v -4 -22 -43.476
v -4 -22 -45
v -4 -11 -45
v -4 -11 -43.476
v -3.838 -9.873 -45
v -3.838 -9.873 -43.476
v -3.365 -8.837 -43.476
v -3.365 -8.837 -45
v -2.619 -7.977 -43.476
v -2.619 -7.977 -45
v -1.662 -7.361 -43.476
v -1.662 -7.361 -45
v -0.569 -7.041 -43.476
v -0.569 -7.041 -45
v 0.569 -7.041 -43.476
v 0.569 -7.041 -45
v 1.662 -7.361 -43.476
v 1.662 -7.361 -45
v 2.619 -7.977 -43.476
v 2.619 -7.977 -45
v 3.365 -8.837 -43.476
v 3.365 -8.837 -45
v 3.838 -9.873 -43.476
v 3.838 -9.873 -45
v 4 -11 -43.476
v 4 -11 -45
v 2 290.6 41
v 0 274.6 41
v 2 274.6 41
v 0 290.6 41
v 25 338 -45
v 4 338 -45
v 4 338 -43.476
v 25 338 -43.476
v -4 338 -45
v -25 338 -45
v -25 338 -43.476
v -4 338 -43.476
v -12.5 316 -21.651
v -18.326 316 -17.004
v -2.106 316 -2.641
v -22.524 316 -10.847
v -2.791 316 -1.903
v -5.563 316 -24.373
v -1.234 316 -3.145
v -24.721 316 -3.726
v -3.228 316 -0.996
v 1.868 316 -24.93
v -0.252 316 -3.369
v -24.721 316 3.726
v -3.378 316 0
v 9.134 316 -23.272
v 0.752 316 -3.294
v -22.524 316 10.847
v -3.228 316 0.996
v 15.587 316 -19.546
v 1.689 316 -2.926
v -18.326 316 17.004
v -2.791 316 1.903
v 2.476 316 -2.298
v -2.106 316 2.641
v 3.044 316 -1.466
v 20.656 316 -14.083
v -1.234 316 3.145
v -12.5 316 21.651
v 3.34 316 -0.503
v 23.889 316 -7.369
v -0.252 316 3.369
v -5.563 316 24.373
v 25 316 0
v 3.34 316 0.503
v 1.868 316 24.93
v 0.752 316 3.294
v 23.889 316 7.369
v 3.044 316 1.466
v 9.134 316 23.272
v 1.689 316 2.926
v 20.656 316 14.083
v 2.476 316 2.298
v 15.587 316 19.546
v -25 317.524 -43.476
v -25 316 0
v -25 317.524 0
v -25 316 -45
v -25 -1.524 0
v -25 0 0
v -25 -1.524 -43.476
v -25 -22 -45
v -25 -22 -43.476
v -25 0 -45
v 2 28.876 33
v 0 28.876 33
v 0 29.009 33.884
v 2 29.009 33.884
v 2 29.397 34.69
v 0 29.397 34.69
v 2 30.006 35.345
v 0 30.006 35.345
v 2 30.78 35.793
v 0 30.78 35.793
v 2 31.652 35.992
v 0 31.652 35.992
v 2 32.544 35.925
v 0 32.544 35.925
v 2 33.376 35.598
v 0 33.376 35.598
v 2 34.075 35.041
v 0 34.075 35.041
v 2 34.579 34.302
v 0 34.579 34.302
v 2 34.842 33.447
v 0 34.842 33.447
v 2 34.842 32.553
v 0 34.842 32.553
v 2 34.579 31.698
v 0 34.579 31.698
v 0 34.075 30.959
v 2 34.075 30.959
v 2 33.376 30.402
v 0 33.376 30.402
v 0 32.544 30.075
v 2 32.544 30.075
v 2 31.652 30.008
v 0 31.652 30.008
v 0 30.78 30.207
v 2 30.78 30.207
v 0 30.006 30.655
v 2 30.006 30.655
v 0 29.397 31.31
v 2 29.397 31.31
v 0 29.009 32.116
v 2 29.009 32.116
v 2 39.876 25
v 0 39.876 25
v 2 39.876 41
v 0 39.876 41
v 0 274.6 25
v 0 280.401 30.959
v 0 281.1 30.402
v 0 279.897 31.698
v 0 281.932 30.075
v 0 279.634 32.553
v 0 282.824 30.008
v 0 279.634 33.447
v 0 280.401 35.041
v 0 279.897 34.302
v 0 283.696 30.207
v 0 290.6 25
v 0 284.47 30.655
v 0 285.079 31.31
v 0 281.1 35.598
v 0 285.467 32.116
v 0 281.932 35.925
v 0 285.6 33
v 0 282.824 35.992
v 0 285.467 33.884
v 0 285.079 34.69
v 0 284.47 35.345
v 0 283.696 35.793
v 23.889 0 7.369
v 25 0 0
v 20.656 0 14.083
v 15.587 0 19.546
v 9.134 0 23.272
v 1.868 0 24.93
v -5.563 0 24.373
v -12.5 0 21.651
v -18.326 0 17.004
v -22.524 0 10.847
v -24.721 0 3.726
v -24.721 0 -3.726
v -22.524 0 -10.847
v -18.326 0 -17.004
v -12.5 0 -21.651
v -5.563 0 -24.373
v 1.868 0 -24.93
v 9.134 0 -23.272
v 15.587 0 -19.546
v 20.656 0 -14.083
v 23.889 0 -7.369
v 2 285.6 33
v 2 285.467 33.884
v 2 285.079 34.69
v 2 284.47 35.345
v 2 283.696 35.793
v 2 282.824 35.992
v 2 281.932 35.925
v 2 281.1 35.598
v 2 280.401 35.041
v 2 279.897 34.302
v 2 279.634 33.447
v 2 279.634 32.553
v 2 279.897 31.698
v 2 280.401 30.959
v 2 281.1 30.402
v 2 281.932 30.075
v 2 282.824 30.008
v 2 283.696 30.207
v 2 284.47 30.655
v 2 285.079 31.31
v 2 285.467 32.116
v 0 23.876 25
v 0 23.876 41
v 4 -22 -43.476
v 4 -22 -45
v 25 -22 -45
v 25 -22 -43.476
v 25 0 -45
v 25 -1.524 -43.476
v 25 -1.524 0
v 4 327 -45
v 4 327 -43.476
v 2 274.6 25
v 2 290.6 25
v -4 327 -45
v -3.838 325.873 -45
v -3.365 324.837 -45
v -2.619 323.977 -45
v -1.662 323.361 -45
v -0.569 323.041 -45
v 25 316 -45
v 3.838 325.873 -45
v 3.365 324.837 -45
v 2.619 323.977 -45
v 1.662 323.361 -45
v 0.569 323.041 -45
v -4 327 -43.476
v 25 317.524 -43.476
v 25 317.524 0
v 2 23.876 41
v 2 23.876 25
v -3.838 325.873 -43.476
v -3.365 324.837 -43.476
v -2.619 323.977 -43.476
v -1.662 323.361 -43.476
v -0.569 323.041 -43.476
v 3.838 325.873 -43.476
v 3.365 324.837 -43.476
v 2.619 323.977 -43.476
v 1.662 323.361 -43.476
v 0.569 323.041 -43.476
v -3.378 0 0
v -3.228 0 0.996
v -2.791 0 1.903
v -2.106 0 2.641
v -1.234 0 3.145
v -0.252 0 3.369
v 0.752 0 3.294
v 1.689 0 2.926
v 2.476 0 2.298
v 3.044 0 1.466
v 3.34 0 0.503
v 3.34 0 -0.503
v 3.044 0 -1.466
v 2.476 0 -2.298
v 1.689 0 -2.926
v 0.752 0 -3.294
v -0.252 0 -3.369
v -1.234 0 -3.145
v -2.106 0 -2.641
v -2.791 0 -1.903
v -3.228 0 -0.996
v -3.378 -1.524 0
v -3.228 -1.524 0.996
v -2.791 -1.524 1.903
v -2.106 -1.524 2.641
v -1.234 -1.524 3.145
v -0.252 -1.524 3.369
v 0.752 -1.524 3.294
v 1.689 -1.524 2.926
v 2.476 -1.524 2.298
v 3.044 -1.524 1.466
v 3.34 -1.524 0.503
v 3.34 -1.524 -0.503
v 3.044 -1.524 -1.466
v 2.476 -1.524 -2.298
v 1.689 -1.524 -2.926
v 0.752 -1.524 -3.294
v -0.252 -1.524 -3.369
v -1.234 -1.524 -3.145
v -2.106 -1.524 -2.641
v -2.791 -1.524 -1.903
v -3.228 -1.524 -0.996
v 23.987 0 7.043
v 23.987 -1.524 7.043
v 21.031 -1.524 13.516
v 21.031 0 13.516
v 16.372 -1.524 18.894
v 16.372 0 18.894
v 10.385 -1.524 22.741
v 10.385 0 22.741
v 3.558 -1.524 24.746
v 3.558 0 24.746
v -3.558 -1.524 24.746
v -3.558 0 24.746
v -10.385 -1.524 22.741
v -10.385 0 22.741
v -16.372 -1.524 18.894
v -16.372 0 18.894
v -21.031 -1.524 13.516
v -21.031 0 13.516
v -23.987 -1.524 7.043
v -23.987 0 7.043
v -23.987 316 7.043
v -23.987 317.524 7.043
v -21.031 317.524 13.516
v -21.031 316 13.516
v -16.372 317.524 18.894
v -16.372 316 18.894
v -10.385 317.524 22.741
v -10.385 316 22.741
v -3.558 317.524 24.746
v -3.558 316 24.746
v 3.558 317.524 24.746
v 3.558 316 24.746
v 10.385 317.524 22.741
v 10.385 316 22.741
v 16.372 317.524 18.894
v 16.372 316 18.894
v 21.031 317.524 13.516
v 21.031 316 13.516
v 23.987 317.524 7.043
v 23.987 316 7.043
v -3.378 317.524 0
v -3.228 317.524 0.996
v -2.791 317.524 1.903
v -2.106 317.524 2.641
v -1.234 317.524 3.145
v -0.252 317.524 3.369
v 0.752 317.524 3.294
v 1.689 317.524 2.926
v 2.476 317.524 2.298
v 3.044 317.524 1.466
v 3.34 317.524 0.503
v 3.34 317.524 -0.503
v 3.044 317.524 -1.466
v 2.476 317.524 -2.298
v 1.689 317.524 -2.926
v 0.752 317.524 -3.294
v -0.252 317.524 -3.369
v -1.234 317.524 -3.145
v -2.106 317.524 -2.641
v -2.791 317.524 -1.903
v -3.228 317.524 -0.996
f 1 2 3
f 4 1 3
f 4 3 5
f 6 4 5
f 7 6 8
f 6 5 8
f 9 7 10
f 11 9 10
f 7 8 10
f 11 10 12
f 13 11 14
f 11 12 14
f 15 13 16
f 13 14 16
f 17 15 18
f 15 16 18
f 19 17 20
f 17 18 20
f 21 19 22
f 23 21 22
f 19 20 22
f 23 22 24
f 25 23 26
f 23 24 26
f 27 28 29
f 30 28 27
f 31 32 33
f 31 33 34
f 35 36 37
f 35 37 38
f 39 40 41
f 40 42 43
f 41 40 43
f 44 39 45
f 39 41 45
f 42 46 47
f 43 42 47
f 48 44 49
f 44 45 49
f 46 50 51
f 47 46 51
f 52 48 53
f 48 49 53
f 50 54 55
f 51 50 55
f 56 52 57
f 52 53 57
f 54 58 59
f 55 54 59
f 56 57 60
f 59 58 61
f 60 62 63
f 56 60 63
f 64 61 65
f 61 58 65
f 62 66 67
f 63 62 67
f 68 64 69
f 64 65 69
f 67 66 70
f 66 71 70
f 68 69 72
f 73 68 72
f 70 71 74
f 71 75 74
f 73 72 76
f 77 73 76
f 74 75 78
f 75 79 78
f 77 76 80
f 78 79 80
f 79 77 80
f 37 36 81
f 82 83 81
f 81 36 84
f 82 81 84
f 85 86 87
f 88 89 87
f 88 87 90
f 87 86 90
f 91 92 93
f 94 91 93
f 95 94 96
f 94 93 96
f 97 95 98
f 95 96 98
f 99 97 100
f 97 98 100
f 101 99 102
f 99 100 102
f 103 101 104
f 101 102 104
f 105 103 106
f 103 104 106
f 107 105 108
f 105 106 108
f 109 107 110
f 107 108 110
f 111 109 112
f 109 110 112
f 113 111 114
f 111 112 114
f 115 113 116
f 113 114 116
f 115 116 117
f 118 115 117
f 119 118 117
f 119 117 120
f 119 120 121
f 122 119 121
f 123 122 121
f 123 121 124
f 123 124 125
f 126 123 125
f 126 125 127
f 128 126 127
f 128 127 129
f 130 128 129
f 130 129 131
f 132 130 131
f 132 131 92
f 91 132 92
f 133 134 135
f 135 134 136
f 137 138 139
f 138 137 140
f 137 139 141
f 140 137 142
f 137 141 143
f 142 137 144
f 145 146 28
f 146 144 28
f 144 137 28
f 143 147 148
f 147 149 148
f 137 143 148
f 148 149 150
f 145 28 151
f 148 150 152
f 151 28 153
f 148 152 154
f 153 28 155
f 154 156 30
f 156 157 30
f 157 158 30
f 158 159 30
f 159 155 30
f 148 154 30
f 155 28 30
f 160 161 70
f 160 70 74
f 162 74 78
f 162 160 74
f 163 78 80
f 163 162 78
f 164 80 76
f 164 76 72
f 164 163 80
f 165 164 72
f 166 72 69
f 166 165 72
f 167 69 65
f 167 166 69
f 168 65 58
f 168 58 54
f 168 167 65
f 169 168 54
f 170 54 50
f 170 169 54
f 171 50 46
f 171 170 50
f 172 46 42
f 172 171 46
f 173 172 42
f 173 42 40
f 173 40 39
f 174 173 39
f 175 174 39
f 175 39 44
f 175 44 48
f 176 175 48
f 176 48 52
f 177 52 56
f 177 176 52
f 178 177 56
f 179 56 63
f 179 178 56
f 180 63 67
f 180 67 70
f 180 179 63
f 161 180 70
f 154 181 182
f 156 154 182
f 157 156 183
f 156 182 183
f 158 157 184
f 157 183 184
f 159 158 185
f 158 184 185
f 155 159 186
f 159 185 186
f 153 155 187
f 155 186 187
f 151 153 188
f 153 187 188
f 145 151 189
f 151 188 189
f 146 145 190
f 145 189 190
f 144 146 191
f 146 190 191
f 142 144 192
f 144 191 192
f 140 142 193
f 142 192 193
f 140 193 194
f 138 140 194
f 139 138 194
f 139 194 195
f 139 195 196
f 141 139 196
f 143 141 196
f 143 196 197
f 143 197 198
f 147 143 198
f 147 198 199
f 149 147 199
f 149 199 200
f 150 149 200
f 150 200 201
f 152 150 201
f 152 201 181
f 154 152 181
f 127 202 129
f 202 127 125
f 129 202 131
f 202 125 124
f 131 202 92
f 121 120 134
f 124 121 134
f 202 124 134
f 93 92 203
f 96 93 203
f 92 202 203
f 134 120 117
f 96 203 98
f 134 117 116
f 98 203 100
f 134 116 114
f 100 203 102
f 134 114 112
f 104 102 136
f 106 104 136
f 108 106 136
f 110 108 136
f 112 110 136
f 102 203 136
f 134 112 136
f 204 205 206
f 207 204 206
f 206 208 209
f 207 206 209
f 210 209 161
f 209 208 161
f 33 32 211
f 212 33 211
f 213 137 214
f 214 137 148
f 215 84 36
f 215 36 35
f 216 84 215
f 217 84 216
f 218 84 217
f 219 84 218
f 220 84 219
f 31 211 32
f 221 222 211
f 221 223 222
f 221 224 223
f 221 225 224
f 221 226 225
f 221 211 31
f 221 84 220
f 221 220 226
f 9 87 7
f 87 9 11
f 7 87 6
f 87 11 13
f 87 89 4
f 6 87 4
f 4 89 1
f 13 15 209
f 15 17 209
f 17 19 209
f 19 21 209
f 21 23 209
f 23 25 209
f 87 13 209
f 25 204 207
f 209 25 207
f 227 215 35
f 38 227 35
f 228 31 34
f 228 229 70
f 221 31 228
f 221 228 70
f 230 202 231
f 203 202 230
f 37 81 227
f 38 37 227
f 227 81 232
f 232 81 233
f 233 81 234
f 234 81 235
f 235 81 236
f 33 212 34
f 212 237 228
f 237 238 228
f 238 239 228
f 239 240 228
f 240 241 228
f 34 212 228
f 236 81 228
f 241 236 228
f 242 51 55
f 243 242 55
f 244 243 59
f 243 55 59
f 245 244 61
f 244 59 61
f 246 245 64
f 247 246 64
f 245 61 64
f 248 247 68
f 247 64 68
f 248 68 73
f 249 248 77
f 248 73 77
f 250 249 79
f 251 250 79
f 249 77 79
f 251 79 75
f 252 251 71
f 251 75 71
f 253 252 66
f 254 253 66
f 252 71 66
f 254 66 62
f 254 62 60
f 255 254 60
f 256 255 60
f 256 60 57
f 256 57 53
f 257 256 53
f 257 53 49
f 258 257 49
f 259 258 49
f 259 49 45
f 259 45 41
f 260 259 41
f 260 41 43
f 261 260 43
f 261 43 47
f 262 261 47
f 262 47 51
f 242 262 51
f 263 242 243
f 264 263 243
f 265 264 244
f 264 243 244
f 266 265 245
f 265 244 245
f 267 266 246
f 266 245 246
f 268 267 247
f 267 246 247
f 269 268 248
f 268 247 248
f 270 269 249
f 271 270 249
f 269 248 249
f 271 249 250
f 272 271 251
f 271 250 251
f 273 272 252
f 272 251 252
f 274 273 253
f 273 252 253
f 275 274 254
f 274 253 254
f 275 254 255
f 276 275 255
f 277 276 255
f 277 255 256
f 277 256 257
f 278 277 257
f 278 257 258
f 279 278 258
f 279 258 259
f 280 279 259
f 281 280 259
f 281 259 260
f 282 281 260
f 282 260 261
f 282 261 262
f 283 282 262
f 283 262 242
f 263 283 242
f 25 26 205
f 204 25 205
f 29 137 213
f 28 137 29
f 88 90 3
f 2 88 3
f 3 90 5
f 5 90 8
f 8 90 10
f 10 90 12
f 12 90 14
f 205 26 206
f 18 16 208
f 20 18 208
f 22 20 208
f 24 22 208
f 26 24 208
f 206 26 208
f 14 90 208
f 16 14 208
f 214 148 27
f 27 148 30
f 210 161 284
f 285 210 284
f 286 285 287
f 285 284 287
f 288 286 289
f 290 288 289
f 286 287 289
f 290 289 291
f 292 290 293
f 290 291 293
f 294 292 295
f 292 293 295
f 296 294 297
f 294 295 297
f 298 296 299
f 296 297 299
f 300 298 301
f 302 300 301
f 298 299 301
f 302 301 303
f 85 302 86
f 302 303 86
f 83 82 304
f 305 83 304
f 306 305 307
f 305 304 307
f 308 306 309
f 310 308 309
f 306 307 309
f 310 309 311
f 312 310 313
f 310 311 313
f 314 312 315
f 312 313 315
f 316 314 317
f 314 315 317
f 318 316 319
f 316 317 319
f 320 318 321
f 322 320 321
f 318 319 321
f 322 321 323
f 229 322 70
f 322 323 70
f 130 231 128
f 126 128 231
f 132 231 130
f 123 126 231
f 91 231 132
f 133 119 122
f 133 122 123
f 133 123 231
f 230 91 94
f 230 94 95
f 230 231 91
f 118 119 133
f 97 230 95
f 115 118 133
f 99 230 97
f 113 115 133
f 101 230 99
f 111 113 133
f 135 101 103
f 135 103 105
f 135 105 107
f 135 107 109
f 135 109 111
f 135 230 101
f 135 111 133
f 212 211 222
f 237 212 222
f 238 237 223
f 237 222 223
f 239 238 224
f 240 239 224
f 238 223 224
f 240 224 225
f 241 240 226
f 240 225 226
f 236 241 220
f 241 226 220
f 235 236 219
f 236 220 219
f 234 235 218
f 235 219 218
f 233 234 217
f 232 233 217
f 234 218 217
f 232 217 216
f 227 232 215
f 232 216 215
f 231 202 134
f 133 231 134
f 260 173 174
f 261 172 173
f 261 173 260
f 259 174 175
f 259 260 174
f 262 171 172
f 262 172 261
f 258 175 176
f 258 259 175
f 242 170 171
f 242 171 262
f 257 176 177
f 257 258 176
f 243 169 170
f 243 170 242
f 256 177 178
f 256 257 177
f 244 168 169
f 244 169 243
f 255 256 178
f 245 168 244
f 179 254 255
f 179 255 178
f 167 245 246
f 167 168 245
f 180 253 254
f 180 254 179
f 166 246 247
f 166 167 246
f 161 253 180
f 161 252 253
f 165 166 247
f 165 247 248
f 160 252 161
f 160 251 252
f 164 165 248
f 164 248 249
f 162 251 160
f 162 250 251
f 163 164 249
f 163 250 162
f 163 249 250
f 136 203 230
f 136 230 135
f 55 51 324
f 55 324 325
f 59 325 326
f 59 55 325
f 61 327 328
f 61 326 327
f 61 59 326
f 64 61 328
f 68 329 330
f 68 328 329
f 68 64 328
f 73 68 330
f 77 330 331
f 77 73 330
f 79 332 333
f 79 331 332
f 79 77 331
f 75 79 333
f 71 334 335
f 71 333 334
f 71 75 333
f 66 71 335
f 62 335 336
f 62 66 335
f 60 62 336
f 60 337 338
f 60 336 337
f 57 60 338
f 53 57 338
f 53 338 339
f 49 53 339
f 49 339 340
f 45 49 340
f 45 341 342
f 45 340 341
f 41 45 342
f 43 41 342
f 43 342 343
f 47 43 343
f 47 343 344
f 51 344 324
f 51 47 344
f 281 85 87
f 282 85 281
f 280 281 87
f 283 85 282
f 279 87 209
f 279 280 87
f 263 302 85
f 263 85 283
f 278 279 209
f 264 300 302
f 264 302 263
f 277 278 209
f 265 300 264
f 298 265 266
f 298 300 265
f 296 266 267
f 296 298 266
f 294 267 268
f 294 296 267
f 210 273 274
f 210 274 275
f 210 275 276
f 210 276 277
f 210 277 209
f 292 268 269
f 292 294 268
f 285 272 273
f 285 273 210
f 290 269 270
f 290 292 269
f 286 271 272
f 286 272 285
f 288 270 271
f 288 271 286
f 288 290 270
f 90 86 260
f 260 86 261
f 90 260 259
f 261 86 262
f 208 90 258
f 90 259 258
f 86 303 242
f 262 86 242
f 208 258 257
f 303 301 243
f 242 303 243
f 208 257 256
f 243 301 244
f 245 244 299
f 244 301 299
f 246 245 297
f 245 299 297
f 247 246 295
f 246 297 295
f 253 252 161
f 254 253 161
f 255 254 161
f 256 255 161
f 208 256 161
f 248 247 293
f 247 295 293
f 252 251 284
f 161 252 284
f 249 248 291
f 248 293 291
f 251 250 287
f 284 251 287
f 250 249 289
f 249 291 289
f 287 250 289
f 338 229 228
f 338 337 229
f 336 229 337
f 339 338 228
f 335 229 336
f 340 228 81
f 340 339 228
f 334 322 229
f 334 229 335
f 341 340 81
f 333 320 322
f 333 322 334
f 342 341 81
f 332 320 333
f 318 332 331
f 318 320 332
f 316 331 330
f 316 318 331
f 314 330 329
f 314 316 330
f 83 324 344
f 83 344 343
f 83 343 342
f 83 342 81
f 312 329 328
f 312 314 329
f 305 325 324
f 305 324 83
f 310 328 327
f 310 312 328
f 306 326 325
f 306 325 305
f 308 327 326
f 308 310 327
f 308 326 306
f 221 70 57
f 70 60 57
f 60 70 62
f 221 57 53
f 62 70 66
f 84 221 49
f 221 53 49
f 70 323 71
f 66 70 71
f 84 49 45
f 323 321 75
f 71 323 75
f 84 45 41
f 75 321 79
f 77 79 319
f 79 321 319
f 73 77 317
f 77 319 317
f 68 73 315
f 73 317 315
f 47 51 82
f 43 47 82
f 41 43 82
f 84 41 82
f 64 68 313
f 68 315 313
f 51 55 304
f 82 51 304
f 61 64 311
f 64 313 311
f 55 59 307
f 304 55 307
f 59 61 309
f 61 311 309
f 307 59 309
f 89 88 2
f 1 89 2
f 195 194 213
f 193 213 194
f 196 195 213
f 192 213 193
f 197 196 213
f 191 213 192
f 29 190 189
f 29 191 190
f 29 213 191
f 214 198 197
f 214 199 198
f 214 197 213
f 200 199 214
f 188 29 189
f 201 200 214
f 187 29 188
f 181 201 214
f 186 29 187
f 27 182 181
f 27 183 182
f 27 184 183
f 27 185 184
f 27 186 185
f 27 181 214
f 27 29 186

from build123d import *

# Parameters (mm, degrees)
F0_R      = 25
F1_DEPTH  = 316
F3_DEPTH  = 1.524
F4_W      = 50
F4_H      = 22
F5_DEPTH  = 1.524
F7_DEPTH  = 1.524
F9_DEPTH  = 1.524
F10_W     = 50
F10_H     = 20.476
F11_DEPTH = 1.524
F13_DEPTH = 1.524
F14_W     = 16
F14_H     = 16
F15_DEPTH = 2
F17_D     = 6
F18_W     = 16
F18_H     = 16
F19_DEPTH = 2
F21_D     = 6
F23_D     = 6.7564
F23_2_D   = 6.7564
F23_3_D   = 6.7564


# Not quite as in the source:
# - a pattern or mirror of a feature is missing from the dataset's text; its kind, count and spacing are read off the source's solid


with BuildPart() as f1:
    # F0 (on Front) → F1 (new body)
    with BuildSketch(Plane.XZ):
        Circle(F0_R)
    extrude(amount=-F1_DEPTH)

    # F23 (through all)
    with Locations(Plane.XZ.offset(1.524)):
        with Locations((0, 0)):
            Hole(F23_D / 2)


with BuildPart() as f3:
    # F2 (on Front) → F3 (new body)
    with BuildSketch(Plane.XZ):
        with BuildLine():
            Line((-25, 0), (25, 0))
            ThreePointArc((25, 0), (0, 25), (-25, 0))
        make_face()
        with BuildLine():
            Line((25, -45), (25, 0))
            ThreePointArc((25, 0), (0, -25), (-25, 0))
            Line((-25, 0), (-25, -45))
            Line((-25, -45), (25, -45))
        make_face()
        with BuildLine():
            ThreePointArc((-25, 0), (0, -25), (25, 0))
            Line((25, 0), (-25, 0))
        make_face()
    extrude(amount=F3_DEPTH)

    # F4 (on face) → F5 (join)
    with BuildSketch(Plane(origin=(0, 0, -45), x_dir=(1, 0, 0), z_dir=(0, 0, -1))):
        with Locations((0, 11)):
            Rectangle(F4_W, F4_H)
    extrude(amount=-F5_DEPTH)

    # F6 (on face) → F7 (cut)
    with BuildSketch(Plane(origin=(0, 0, -45), x_dir=(1, 0, 0), z_dir=(0, 0, -1))):
        with BuildLine():
            Line((-4, 11), (4, 11))
            ThreePointArc((4, 11), (0, 15), (-4, 11))
        make_face()
        with BuildLine():
            ThreePointArc((-4, 11), (0, 7), (4, 11))
            Line((4, 11), (-4, 11))
        make_face()
        with BuildLine():
            ThreePointArc((-4, 11), (0, 15), (4, 11))
            Line((4, 11), (4, 22))
            Line((4, 22), (-4, 22))
            Line((-4, 22), (-4, 11))
        make_face()
    extrude(amount=-F7_DEPTH, mode=Mode.SUBTRACT)

    # F23#2 (through all)
    with Locations(Plane.XZ.offset(1.524)):
        with Locations((0, 0)):
            Hole(F23_2_D / 2)


with BuildPart() as f9:
    # F8 (on face) → F9 (new body)
    with BuildSketch(Plane(origin=(0, 316, 0), x_dir=(-1, 0, 0), z_dir=(0, 1, 0))):
        with BuildLine():
            Line((-25, 0), (25, 0))
            ThreePointArc((25, 0), (0, 25), (-25, 0))
        make_face()
        with BuildLine():
            Line((25, -45), (25, 0))
            ThreePointArc((25, 0), (0, -25), (-25, 0))
            Line((-25, 0), (-25, -45))
            Line((-25, -45), (25, -45))
        make_face()
        with BuildLine():
            ThreePointArc((-25, 0), (0, -25), (25, 0))
            Line((25, 0), (-25, 0))
        make_face()
    extrude(amount=F9_DEPTH)

    # F10 (on face) → F11 (join)
    with BuildSketch(Plane(origin=(0, 0, -45), x_dir=(1, 0, 0), z_dir=(0, 0, -1))):
        with Locations((0, -327.762)):
            Rectangle(F10_W, F10_H)
    extrude(amount=-F11_DEPTH)

    # F12 (on face) → F13 (cut)
    with BuildSketch(Plane(origin=(0, 0, -45), x_dir=(1, 0, 0), z_dir=(0, 0, -1))):
        with BuildLine():
            Line((-4, -327), (4, -327))
            ThreePointArc((4, -327), (0, -323), (-4, -327))
        make_face()
        with BuildLine():
            Line((4, -338), (4, -327))
            ThreePointArc((4, -327), (0, -331), (-4, -327))
            Line((-4, -327), (-4, -338))
            Line((-4, -338), (4, -338))
        make_face()
        with BuildLine():
            ThreePointArc((-4, -327), (0, -331), (4, -327))
            Line((4, -327), (-4, -327))
        make_face()
    extrude(amount=-F13_DEPTH, mode=Mode.SUBTRACT)

    # F23#3 (through all)
    with Locations(Plane.XZ.offset(1.524)):
        with Locations((0, 0)):
            f23_3 = Hole(F23_3_D / 2)

    # F23_3_copies: F23#3 across plane
    add(f23_3.mirror(Plane.ZX.offset(158)), mode=Mode.SUBTRACT)


with BuildPart() as f15:
    # F14 (on Right) → F15 (new body)
    with BuildSketch(Plane.YZ):
        with Locations((31.876, 33)):
            Rectangle(F14_W, F14_H)
    extrude(amount=F15_DEPTH)

    # F17 (through all)
    with Locations(Plane.YZ.offset(2)):
        with Locations((31.876, 33)):
            Hole(F17_D / 2)


with BuildPart() as f19:
    # F18 (on Right) → F19 (new body)
    with BuildSketch(Plane.YZ):
        with Locations((282.6, 33)):
            Rectangle(F18_W, F18_H)
    extrude(amount=F19_DEPTH)

    # F21 (through all)
    with Locations(Plane(origin=(0, 0, 0), x_dir=(0, -1, 0), z_dir=(-1, 0, 0))):
        with Locations((-282.6, 33)):
            Hole(F21_D / 2)


solid = Compound([f1.part, f3.part, f9.part, f15.part, f19.part])
